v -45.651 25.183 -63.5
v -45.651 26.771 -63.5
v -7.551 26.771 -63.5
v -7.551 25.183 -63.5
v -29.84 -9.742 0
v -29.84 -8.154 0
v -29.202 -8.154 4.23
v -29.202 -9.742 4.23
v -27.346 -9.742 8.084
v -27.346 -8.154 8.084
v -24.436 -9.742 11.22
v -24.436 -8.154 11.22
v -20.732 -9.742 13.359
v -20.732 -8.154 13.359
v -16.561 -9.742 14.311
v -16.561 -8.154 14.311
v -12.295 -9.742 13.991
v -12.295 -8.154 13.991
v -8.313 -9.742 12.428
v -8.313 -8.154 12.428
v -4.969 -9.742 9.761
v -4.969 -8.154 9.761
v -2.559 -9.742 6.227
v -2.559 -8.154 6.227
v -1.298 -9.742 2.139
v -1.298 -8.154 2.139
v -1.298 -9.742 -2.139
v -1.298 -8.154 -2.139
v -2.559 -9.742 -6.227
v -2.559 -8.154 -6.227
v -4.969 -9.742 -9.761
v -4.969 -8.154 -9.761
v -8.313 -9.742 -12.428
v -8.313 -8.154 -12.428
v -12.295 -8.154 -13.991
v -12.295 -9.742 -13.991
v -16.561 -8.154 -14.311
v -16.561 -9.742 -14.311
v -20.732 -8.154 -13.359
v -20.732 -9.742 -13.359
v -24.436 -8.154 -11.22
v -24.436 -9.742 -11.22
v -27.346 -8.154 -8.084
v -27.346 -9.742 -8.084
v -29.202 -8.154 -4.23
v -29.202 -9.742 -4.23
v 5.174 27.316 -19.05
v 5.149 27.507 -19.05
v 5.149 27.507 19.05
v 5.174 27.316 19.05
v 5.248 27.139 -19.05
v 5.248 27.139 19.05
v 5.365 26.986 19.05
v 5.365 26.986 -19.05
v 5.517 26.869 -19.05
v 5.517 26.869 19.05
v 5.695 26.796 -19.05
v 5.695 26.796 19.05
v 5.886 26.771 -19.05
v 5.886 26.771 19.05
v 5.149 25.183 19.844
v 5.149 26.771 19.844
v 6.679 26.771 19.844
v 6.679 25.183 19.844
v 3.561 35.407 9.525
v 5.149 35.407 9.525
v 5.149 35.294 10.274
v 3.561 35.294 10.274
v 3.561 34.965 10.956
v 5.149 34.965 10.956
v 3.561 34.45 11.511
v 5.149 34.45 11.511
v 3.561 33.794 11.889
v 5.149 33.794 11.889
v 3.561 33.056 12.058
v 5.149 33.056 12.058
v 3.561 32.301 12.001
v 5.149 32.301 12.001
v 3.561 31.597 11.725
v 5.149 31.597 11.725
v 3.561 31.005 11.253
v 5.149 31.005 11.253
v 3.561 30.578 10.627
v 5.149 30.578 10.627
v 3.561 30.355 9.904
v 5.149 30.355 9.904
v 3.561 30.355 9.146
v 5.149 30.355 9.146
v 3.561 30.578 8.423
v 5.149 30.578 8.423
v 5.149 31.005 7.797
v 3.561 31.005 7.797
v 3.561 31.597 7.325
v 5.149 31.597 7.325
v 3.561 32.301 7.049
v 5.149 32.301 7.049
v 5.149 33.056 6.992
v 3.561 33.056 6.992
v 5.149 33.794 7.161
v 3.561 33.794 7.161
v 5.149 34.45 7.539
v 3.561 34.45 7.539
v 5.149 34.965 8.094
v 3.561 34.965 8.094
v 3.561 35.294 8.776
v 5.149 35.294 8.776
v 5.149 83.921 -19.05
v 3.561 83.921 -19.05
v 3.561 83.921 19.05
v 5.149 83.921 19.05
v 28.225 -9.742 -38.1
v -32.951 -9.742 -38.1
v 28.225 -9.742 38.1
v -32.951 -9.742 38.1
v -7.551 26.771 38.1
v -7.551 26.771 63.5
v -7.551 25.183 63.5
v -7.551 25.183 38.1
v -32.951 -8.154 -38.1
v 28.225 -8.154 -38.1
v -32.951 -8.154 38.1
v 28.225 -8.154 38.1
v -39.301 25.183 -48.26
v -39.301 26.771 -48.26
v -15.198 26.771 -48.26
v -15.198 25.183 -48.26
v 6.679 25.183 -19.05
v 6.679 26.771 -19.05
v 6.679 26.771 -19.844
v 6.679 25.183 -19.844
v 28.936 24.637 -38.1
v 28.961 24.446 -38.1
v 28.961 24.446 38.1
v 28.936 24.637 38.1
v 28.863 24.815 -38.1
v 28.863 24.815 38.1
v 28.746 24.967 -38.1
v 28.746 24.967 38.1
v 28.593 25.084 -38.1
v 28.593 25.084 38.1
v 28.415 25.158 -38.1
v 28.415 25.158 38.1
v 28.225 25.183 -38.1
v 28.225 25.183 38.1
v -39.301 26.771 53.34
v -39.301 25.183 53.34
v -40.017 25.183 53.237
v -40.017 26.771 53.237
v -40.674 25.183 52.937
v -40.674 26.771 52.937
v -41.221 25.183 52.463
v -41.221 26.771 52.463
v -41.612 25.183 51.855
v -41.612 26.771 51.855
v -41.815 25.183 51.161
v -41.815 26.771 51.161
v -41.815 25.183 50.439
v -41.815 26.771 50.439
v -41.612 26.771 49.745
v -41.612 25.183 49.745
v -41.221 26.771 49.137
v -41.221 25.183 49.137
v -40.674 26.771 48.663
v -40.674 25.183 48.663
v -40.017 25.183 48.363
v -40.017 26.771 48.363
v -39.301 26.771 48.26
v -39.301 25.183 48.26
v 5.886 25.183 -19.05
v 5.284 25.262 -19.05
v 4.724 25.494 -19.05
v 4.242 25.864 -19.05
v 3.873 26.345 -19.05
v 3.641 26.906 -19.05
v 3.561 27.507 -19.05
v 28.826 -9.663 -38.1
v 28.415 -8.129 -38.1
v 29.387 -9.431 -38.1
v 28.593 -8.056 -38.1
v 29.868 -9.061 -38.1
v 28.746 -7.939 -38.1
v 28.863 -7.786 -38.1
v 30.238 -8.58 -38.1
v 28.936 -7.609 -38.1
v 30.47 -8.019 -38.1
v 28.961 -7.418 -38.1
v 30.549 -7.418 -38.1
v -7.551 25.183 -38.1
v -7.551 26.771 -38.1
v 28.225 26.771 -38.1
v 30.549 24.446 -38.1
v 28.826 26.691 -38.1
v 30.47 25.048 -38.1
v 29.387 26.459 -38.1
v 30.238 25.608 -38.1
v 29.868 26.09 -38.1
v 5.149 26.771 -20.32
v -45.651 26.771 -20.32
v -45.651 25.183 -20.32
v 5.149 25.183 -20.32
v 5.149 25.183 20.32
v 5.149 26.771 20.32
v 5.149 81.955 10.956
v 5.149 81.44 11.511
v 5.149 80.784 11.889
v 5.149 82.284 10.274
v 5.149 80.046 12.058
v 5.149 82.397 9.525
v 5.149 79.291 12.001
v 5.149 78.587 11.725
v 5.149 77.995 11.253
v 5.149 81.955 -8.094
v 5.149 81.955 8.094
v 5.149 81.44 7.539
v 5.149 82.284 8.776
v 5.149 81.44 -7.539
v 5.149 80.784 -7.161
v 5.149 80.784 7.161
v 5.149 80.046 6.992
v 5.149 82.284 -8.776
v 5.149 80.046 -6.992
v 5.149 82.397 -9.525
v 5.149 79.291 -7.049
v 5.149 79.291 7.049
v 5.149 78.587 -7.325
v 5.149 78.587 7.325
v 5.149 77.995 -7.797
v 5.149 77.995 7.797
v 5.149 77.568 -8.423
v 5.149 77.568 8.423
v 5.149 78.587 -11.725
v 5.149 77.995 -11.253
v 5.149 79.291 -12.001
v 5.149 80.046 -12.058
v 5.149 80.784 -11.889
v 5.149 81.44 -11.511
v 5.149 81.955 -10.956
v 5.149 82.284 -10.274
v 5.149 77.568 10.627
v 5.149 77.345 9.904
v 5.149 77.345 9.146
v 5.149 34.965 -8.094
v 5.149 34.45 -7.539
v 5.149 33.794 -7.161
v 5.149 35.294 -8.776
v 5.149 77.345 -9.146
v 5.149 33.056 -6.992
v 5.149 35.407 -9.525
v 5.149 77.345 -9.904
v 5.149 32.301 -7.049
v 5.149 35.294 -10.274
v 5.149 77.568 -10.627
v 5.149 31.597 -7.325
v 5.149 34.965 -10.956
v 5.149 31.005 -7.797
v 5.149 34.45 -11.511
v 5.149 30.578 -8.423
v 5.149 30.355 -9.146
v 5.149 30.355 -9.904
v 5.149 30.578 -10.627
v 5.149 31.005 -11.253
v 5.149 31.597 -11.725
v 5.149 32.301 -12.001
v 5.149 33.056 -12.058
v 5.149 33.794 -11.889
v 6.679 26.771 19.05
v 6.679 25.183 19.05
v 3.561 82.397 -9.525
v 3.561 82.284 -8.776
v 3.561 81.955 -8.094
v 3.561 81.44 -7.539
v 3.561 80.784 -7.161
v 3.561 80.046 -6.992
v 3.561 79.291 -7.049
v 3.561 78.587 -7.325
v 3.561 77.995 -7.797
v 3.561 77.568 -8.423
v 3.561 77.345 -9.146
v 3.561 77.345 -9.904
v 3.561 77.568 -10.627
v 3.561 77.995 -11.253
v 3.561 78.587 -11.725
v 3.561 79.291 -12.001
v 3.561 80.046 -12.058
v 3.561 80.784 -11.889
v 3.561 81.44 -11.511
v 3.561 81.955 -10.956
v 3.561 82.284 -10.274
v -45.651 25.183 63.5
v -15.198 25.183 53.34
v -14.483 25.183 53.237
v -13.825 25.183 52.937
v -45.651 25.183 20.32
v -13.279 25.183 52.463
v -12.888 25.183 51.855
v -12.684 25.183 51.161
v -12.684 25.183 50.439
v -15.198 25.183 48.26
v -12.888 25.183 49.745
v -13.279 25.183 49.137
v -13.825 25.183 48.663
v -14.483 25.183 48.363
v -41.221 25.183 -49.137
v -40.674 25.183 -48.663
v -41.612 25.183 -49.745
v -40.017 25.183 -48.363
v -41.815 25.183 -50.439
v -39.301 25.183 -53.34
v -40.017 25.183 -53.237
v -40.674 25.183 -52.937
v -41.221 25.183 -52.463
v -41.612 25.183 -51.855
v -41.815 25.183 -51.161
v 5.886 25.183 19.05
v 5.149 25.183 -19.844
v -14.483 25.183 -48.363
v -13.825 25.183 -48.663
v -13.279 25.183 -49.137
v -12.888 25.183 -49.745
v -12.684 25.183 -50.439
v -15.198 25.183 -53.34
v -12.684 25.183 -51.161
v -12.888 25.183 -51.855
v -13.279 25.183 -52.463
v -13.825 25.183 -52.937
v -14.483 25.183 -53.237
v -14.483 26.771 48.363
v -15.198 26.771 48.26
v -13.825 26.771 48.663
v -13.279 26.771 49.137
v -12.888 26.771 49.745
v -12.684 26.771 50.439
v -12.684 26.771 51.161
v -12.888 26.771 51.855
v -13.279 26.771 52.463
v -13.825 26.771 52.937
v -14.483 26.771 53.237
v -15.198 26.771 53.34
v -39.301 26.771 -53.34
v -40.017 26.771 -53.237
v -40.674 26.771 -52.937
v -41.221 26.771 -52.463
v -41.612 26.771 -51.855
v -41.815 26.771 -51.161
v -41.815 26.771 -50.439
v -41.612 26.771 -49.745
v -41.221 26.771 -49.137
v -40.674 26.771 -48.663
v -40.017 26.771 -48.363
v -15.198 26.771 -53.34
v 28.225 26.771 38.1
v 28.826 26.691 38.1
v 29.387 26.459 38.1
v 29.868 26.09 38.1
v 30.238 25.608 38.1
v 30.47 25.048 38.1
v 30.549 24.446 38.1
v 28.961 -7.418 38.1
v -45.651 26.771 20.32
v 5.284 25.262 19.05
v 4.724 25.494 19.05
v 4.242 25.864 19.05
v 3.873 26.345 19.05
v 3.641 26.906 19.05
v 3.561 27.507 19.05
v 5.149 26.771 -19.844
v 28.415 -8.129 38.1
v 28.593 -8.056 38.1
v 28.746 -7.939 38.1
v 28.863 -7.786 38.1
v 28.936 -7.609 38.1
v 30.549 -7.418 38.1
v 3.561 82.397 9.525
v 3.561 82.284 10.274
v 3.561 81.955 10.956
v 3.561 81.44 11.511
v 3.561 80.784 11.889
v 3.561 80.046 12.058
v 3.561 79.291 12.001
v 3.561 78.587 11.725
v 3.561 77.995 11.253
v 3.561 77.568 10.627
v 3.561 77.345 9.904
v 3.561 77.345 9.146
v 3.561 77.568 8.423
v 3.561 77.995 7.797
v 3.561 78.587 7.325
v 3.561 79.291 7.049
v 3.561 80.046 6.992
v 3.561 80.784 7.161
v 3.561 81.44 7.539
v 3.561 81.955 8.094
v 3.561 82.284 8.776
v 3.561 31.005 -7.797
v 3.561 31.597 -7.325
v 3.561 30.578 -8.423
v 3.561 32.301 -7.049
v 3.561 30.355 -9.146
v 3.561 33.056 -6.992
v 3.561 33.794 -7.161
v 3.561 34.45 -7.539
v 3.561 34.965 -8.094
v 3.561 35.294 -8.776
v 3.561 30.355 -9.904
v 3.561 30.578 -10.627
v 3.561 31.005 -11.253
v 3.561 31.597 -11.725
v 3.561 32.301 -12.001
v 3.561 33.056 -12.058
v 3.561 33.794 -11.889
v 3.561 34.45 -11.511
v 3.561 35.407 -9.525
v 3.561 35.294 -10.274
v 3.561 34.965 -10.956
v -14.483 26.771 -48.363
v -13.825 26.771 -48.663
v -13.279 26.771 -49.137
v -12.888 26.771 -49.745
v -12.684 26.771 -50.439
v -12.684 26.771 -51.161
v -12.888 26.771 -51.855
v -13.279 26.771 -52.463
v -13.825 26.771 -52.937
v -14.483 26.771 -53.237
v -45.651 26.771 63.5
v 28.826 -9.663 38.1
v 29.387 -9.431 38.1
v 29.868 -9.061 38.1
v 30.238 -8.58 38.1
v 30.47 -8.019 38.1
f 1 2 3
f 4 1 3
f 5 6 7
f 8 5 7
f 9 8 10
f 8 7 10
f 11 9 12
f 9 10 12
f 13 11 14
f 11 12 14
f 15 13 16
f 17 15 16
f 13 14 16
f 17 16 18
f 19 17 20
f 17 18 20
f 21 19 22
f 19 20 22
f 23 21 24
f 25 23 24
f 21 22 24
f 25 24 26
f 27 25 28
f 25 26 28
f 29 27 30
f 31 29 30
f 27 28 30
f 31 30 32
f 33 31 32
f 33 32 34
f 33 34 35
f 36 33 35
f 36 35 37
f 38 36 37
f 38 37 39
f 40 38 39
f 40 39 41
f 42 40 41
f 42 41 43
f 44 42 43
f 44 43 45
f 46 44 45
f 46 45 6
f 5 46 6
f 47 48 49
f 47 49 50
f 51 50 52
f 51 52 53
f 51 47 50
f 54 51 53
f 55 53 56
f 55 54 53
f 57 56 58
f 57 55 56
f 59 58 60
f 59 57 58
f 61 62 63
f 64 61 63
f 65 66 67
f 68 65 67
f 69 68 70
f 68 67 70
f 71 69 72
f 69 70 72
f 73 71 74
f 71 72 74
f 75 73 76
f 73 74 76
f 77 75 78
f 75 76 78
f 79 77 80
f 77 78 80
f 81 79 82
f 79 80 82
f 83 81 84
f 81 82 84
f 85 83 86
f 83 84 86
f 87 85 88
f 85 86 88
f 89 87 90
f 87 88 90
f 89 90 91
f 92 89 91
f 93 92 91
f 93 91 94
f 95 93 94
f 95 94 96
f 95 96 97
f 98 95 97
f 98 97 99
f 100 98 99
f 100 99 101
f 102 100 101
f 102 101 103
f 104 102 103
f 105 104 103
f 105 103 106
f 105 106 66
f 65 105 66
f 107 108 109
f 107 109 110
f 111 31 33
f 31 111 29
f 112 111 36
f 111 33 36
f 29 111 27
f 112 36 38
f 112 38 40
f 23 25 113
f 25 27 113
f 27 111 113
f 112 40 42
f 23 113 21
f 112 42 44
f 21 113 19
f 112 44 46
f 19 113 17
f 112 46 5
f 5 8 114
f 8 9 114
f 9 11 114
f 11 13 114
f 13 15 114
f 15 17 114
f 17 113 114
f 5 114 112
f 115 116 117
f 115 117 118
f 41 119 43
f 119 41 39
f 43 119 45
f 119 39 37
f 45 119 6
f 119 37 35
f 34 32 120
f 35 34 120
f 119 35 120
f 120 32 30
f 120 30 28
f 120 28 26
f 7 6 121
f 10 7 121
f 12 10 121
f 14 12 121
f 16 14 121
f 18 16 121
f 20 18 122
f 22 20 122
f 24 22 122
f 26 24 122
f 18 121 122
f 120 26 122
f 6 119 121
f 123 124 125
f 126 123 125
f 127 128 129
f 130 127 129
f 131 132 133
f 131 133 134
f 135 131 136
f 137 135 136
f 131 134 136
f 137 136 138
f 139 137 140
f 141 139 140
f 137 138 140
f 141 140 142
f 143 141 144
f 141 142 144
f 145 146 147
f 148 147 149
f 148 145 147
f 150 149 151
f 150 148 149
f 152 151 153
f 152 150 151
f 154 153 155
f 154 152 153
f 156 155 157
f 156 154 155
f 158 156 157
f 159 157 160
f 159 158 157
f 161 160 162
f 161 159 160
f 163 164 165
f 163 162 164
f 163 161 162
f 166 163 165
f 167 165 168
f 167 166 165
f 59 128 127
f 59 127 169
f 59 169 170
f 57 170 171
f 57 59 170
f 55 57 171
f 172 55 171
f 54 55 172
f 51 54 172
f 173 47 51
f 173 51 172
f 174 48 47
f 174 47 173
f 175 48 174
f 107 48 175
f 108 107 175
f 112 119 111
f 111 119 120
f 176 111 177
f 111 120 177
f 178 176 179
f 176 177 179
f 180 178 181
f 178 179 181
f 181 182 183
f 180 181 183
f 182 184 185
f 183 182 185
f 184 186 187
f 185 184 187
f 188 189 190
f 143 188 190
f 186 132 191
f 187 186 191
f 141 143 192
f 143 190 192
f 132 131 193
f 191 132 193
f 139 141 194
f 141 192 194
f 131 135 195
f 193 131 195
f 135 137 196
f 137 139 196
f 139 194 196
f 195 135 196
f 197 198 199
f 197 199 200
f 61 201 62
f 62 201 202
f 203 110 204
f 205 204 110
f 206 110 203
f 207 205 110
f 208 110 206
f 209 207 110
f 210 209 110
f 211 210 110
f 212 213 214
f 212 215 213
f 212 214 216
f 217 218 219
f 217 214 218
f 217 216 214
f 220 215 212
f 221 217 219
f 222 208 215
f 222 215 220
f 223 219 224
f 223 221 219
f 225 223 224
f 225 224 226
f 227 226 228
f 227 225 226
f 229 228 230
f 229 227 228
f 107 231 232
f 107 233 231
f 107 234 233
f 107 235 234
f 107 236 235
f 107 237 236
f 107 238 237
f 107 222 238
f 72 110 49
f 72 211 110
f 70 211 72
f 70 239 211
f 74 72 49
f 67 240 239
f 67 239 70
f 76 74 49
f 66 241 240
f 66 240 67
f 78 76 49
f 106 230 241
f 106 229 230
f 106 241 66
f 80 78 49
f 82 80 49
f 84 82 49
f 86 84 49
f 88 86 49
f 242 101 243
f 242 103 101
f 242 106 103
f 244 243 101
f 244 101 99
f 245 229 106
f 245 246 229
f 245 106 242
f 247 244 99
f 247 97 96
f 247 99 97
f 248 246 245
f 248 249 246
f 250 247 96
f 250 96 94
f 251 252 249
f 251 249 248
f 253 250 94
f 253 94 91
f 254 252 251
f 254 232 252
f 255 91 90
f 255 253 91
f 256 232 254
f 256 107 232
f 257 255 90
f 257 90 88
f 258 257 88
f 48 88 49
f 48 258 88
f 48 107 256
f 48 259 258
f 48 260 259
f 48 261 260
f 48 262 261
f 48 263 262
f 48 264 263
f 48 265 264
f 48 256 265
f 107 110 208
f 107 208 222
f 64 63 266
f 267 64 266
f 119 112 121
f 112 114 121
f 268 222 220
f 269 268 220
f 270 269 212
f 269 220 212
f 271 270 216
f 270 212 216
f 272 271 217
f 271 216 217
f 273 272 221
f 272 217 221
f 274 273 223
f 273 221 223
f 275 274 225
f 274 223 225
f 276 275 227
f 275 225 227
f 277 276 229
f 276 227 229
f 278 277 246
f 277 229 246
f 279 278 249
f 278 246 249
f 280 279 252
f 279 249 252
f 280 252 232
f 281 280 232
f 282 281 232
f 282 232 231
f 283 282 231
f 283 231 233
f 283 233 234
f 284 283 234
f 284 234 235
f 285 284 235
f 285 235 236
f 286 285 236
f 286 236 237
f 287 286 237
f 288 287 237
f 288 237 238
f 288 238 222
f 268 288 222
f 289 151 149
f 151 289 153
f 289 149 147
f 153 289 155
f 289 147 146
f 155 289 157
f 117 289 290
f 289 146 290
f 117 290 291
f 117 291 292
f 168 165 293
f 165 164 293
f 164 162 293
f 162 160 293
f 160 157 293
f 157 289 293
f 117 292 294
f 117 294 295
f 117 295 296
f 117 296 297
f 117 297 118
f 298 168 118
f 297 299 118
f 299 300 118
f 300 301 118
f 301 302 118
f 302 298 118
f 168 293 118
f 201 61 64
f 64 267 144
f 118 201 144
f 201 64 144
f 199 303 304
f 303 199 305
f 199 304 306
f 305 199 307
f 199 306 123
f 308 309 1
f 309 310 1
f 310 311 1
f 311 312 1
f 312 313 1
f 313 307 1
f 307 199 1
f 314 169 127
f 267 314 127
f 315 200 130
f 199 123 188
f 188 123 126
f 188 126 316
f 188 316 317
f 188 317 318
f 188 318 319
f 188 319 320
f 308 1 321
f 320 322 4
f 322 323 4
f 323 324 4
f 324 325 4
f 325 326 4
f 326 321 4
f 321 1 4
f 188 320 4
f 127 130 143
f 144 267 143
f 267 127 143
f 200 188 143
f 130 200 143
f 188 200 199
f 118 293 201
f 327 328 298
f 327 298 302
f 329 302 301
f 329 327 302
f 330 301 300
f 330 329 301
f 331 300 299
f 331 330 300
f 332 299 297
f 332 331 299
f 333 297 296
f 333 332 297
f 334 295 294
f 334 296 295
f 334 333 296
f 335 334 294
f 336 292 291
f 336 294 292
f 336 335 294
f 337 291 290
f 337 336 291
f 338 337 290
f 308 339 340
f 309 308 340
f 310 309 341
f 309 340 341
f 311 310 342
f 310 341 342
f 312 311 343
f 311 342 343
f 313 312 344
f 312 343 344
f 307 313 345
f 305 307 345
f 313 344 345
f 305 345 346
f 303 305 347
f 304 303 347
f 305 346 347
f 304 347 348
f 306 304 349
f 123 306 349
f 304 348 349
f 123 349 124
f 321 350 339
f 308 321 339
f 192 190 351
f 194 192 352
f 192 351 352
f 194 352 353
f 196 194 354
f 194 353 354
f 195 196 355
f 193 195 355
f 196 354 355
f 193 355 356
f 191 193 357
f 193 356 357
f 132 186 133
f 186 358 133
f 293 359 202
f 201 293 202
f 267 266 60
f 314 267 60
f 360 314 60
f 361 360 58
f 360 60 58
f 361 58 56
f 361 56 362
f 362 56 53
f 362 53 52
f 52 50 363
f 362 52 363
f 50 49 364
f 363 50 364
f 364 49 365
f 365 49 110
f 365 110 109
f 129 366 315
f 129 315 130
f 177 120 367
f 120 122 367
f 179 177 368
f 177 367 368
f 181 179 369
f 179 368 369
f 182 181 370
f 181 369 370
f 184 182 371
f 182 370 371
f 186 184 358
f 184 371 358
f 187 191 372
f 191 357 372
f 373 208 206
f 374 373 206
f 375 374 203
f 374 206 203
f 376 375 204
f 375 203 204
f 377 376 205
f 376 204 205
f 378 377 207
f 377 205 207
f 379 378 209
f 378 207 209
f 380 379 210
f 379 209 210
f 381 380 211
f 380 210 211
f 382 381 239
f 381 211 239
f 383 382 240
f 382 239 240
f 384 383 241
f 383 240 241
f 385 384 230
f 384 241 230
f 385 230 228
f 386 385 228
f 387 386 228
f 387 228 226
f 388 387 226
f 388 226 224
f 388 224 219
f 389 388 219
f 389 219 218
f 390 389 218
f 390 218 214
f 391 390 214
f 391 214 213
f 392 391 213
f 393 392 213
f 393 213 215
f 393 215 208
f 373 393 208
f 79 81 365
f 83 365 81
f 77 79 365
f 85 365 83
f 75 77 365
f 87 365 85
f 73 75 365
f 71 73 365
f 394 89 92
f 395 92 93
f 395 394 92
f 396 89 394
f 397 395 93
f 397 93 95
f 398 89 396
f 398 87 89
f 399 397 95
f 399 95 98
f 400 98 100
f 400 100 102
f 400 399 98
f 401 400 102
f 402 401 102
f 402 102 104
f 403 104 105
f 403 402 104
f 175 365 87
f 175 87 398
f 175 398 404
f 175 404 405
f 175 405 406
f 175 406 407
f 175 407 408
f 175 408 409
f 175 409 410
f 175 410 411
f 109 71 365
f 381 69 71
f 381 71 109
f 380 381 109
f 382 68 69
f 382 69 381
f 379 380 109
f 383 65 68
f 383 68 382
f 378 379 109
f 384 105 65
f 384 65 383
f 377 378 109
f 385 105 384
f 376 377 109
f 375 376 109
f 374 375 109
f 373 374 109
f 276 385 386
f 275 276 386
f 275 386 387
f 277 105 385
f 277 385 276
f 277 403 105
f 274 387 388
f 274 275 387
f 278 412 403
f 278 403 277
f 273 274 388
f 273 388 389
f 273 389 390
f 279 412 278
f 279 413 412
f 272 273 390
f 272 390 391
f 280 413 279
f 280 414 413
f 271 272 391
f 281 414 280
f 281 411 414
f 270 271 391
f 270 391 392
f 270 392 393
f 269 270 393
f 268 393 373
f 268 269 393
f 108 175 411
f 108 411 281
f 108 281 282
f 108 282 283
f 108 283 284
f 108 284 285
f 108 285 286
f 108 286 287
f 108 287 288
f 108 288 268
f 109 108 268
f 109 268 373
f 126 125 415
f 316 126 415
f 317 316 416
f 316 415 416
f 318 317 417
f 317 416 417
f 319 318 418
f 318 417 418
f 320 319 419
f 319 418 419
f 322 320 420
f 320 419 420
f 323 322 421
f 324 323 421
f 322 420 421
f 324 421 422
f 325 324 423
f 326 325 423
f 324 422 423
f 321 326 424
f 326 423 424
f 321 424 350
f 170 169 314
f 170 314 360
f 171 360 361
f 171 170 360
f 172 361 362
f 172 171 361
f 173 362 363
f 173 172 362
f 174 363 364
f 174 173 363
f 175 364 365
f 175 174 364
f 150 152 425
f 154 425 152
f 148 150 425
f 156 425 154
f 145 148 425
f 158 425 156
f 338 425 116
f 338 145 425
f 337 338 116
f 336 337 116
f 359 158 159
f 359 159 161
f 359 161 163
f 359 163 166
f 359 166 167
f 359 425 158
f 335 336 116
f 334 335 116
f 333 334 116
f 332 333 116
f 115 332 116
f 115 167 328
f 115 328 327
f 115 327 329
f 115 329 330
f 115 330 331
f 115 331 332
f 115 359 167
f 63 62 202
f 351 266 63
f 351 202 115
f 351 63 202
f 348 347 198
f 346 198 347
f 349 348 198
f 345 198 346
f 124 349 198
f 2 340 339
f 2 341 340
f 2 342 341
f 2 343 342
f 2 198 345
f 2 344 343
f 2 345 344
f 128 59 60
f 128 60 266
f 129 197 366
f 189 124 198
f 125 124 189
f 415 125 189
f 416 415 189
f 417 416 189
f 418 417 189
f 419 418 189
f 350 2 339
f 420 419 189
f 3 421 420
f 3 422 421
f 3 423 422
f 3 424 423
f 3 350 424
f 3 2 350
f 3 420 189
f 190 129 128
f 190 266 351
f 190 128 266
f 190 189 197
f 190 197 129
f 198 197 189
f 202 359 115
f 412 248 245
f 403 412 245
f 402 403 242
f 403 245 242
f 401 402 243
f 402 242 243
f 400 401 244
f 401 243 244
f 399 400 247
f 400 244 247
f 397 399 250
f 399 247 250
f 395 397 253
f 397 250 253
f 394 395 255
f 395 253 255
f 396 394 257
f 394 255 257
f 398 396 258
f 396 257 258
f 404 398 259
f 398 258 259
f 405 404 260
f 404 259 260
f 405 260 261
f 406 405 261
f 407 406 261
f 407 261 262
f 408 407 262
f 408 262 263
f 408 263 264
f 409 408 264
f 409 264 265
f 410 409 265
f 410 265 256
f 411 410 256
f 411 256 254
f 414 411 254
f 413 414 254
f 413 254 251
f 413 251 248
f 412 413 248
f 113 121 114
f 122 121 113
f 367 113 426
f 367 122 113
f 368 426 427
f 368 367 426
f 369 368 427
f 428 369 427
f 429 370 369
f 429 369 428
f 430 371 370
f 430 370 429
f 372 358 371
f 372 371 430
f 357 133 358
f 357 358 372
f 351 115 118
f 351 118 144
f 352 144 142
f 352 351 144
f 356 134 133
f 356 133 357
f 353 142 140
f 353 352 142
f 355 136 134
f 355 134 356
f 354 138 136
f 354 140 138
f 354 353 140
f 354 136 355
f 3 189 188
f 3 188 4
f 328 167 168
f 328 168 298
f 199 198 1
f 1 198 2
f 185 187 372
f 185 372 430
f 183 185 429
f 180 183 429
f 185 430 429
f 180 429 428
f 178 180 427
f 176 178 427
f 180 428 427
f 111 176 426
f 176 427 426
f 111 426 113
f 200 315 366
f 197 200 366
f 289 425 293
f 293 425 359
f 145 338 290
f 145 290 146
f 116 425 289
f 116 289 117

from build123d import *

# Parameters (mm, degrees)
BASE_FLANGE1_DEPTH            = 38.1
SKETCH4_W                     = 50.8
SKETCH4_H                     = 17.78
TAB1_DEPTH                    = 1.5875
SKETCH5_W                     = 50.8
SKETCH5_H                     = 17.78
TAB2_DEPTH                    = 1.5875
EDGE_FLANGE4_STRIP_W          = 7.8232
EDGE_FLANGE4_STRIP_H          = 1.5875
EDGE_FLANGE4_STRIP_CUT_DEPTH  = 38.1
EDGE_FLANGE4_RELIEF_W         = 8.61695
EDGE_FLANGE4_RELIEF_H         = 0.79375
EDGE_FLANGE4_RELIEF_CUT_DEPTH = 1.5875
EDGE_FLANGE4_DEPTH            = 38.1
SKETCH18_R                    = 14.351
CUT_EXTRUDE1_DEPTH            = 110.605811015
SKETCH19_W                    = 38.1
SKETCH19_H                    = 25.4
TAB3_DEPTH                    = 1.5875
SKETCH20_W                    = 38.1
SKETCH20_H                    = 25.4
TAB4_DEPTH                    = 1.5875
SKETCH21_R                    = 2.54
CUT_EXTRUDE2_DEPTH            = 117.856930597
CUT_EXTRUDE4_DEPTH            = 97.862741461


# Sheet-metal steps are written as plain solids
with BuildPart() as part:
    # Sketch1 → Base-Flange1 (new, symmetric)
    with BuildSketch(Plane.XY):
        with BuildLine():
            Line((5.148952002, 26.77051137), (28.224852002, 26.77051137))
            ThreePointArc((28.224852002, 26.77051137), (29.868238872, 26.08979824), (30.548952002, 24.44641137))
            Line((30.548952002, 24.44641137), (30.548952002, -7.41788863))
            ThreePointArc((30.548952002, -7.41788863), (29.868238872, -9.061275501), (28.224852002, -9.74198863))
            Line((28.224852002, -9.74198863), (-32.951047998, -9.74198863))
            Line((-32.951047998, -9.74198863), (-32.951047998, -8.15448863))
            Line((-32.951047998, -8.15448863), (28.224852002, -8.15448863))
            ThreePointArc((28.224852002, -8.15448863), (28.745706857, -7.938743485), (28.961452002, -7.41788863))
            Line((28.961452002, -7.41788863), (28.961452002, 24.44641137))
            ThreePointArc((28.961452002, 24.44641137), (28.745706857, 24.967266225), (28.224852002, 25.18301137))
            Line((28.224852002, 25.18301137), (5.148952002, 25.18301137))
            Line((5.148952002, 25.18301137), (5.148952002, 26.77051137))
        make_face()
    extrude(amount=BASE_FLANGE1_DEPTH, both=True)

    # Sketch4 → Tab1 (add)
    with BuildSketch(Plane(origin=(0, 26.77051137, 0), x_dir=(1, 0, 0), z_dir=(0, 1, 0))):
        with Locations((-20.251047998, -29.21)):
            Rectangle(SKETCH4_W, SKETCH4_H)
    extrude(amount=-TAB1_DEPTH)

    # Sketch5 → Tab2 (add)
    with BuildSketch(Plane(origin=(0, 26.77051137, 0), x_dir=(1, 0, 0), z_dir=(0, 1, 0))):
        with Locations((-20.251047998, 29.21)):
            Rectangle(SKETCH5_W, SKETCH5_H)
    extrude(amount=-TAB2_DEPTH)

    # Edge-Flange4 strip (across the edge) → Edge-Flange4 strip cut (cut)
    with BuildSketch(Plane(origin=(5.148952002, 26.77051137, -19.05), x_dir=(1, 0, 0), z_dir=(0, 0, 1))):
        with Locations((-3.175, -0.79375)):
            Rectangle(EDGE_FLANGE4_STRIP_W, EDGE_FLANGE4_STRIP_H)
    extrude(amount=EDGE_FLANGE4_STRIP_CUT_DEPTH, mode=Mode.SUBTRACT)

    # Edge-Flange4 relief (on the sheet) → Edge-Flange4 relief cut (cut)
    with BuildSketch(Plane(origin=(5.885552002, 26.77051137, -19.05), x_dir=(1, 0, 0), z_dir=(0, 1, 0))):
        with Locations((-3.514725, 0.396875)):
            Rectangle(EDGE_FLANGE4_RELIEF_W, EDGE_FLANGE4_RELIEF_H)
        with Locations((-3.514725, -38.496875)):
            Rectangle(EDGE_FLANGE4_RELIEF_W, EDGE_FLANGE4_RELIEF_H)
    extrude(amount=-EDGE_FLANGE4_RELIEF_CUT_DEPTH, mode=Mode.SUBTRACT)

    # Edge-Flange4 section (across the edge) → Edge-Flange4 (add)
    with BuildSketch(Plane(origin=(5.148952002, 26.77051137, -19.05), x_dir=(1, 0, 0), z_dir=(0, 0, 1))):
        with BuildLine():
            Line((-1.5875, 0.7366), (-1.5875, 57.15))
            Line((-1.5875, 57.15), (0, 57.15))
            Line((0, 57.15), (0, 0.7366))
            ThreePointArc((0, 0.7366), (0.215745145, 0.215745145), (0.7366, 0))
            Line((0.7366, 0), (0.7366, -1.5875))
            ThreePointArc((0.7366, -1.5875), (-0.90678687, -0.90678687), (-1.5875, 0.7366))
        make_face()
    extrude(amount=EDGE_FLANGE4_DEPTH)

    # Sketch18 → Cut-Extrude1 (cut, through all)
    with BuildSketch(Plane(origin=(0, -8.15448863, 0), x_dir=(1, 0, 0), z_dir=(0, 1, 0))):
        with Locations(Location((-15.488547998, 0, 0), (0, 0, 180))):
            Circle(SKETCH18_R)
    extrude(amount=-CUT_EXTRUDE1_DEPTH, mode=Mode.SUBTRACT)

    # Sketch19 → Tab3 (add)
    with BuildSketch(Plane(origin=(0, 26.77051137, 0), x_dir=(1, 0, 0), z_dir=(0, 1, 0))):
        with Locations((-26.601047998, -50.8)):
            Rectangle(SKETCH19_W, SKETCH19_H)
    extrude(amount=-TAB3_DEPTH)

    # Sketch20 → Tab4 (add)
    with BuildSketch(Plane(origin=(0, 26.77051137, 0), x_dir=(1, 0, 0), z_dir=(0, 1, 0))):
        with Locations((-26.601047998, 50.8)):
            Rectangle(SKETCH20_W, SKETCH20_H)
    extrude(amount=-TAB4_DEPTH)

    # Sketch21 → Cut-Extrude2 (cut, through all)
    with BuildSketch(Plane(origin=(5.148952002, 0, 0), x_dir=(0, 0, -1), z_dir=(1, 0, 0))):
        with Locations(Location((-9.525, 32.86651137, 0), (0, 0, 90))):
            Circle(SKETCH21_R)
        with Locations(Location((9.525, 32.86651137, 0), (0, 0, 90))):
            Circle(SKETCH21_R)
        with Locations(Location((-9.525, 79.85651137, 0), (0, 0, 90))):
            Circle(SKETCH21_R)
        with Locations(Location((9.525, 79.85651137, 0), (0, 0, 90))):
            Circle(SKETCH21_R)
    extrude(amount=-CUT_EXTRUDE2_DEPTH, mode=Mode.SUBTRACT)

    # Sketch24 → Cut-Extrude4 (cut, through all)
    with BuildSketch(Plane(origin=(0, 26.77051137, 0), x_dir=(1, 0, 0), z_dir=(0, 1, 0))):
        with BuildLine():
            Line((-39.301047998, -48.26), (-15.19816231, -48.26))
            ThreePointArc((-15.19816231, -48.26), (-12.65816231, -50.8), (-15.19816231, -53.34))
            Line((-15.19816231, -53.34), (-39.301047998, -53.34))
            ThreePointArc((-39.301047998, -53.34), (-41.841047998, -50.8), (-39.301047998, -48.26))
        make_face()
    cut_extrude4 = extrude(amount=-CUT_EXTRUDE4_DEPTH, mode=Mode.SUBTRACT)

    # Mirror1: Cut-Extrude4 across plane
    add(cut_extrude4.mirror(Plane.XY), mode=Mode.SUBTRACT)


solid = part.part
